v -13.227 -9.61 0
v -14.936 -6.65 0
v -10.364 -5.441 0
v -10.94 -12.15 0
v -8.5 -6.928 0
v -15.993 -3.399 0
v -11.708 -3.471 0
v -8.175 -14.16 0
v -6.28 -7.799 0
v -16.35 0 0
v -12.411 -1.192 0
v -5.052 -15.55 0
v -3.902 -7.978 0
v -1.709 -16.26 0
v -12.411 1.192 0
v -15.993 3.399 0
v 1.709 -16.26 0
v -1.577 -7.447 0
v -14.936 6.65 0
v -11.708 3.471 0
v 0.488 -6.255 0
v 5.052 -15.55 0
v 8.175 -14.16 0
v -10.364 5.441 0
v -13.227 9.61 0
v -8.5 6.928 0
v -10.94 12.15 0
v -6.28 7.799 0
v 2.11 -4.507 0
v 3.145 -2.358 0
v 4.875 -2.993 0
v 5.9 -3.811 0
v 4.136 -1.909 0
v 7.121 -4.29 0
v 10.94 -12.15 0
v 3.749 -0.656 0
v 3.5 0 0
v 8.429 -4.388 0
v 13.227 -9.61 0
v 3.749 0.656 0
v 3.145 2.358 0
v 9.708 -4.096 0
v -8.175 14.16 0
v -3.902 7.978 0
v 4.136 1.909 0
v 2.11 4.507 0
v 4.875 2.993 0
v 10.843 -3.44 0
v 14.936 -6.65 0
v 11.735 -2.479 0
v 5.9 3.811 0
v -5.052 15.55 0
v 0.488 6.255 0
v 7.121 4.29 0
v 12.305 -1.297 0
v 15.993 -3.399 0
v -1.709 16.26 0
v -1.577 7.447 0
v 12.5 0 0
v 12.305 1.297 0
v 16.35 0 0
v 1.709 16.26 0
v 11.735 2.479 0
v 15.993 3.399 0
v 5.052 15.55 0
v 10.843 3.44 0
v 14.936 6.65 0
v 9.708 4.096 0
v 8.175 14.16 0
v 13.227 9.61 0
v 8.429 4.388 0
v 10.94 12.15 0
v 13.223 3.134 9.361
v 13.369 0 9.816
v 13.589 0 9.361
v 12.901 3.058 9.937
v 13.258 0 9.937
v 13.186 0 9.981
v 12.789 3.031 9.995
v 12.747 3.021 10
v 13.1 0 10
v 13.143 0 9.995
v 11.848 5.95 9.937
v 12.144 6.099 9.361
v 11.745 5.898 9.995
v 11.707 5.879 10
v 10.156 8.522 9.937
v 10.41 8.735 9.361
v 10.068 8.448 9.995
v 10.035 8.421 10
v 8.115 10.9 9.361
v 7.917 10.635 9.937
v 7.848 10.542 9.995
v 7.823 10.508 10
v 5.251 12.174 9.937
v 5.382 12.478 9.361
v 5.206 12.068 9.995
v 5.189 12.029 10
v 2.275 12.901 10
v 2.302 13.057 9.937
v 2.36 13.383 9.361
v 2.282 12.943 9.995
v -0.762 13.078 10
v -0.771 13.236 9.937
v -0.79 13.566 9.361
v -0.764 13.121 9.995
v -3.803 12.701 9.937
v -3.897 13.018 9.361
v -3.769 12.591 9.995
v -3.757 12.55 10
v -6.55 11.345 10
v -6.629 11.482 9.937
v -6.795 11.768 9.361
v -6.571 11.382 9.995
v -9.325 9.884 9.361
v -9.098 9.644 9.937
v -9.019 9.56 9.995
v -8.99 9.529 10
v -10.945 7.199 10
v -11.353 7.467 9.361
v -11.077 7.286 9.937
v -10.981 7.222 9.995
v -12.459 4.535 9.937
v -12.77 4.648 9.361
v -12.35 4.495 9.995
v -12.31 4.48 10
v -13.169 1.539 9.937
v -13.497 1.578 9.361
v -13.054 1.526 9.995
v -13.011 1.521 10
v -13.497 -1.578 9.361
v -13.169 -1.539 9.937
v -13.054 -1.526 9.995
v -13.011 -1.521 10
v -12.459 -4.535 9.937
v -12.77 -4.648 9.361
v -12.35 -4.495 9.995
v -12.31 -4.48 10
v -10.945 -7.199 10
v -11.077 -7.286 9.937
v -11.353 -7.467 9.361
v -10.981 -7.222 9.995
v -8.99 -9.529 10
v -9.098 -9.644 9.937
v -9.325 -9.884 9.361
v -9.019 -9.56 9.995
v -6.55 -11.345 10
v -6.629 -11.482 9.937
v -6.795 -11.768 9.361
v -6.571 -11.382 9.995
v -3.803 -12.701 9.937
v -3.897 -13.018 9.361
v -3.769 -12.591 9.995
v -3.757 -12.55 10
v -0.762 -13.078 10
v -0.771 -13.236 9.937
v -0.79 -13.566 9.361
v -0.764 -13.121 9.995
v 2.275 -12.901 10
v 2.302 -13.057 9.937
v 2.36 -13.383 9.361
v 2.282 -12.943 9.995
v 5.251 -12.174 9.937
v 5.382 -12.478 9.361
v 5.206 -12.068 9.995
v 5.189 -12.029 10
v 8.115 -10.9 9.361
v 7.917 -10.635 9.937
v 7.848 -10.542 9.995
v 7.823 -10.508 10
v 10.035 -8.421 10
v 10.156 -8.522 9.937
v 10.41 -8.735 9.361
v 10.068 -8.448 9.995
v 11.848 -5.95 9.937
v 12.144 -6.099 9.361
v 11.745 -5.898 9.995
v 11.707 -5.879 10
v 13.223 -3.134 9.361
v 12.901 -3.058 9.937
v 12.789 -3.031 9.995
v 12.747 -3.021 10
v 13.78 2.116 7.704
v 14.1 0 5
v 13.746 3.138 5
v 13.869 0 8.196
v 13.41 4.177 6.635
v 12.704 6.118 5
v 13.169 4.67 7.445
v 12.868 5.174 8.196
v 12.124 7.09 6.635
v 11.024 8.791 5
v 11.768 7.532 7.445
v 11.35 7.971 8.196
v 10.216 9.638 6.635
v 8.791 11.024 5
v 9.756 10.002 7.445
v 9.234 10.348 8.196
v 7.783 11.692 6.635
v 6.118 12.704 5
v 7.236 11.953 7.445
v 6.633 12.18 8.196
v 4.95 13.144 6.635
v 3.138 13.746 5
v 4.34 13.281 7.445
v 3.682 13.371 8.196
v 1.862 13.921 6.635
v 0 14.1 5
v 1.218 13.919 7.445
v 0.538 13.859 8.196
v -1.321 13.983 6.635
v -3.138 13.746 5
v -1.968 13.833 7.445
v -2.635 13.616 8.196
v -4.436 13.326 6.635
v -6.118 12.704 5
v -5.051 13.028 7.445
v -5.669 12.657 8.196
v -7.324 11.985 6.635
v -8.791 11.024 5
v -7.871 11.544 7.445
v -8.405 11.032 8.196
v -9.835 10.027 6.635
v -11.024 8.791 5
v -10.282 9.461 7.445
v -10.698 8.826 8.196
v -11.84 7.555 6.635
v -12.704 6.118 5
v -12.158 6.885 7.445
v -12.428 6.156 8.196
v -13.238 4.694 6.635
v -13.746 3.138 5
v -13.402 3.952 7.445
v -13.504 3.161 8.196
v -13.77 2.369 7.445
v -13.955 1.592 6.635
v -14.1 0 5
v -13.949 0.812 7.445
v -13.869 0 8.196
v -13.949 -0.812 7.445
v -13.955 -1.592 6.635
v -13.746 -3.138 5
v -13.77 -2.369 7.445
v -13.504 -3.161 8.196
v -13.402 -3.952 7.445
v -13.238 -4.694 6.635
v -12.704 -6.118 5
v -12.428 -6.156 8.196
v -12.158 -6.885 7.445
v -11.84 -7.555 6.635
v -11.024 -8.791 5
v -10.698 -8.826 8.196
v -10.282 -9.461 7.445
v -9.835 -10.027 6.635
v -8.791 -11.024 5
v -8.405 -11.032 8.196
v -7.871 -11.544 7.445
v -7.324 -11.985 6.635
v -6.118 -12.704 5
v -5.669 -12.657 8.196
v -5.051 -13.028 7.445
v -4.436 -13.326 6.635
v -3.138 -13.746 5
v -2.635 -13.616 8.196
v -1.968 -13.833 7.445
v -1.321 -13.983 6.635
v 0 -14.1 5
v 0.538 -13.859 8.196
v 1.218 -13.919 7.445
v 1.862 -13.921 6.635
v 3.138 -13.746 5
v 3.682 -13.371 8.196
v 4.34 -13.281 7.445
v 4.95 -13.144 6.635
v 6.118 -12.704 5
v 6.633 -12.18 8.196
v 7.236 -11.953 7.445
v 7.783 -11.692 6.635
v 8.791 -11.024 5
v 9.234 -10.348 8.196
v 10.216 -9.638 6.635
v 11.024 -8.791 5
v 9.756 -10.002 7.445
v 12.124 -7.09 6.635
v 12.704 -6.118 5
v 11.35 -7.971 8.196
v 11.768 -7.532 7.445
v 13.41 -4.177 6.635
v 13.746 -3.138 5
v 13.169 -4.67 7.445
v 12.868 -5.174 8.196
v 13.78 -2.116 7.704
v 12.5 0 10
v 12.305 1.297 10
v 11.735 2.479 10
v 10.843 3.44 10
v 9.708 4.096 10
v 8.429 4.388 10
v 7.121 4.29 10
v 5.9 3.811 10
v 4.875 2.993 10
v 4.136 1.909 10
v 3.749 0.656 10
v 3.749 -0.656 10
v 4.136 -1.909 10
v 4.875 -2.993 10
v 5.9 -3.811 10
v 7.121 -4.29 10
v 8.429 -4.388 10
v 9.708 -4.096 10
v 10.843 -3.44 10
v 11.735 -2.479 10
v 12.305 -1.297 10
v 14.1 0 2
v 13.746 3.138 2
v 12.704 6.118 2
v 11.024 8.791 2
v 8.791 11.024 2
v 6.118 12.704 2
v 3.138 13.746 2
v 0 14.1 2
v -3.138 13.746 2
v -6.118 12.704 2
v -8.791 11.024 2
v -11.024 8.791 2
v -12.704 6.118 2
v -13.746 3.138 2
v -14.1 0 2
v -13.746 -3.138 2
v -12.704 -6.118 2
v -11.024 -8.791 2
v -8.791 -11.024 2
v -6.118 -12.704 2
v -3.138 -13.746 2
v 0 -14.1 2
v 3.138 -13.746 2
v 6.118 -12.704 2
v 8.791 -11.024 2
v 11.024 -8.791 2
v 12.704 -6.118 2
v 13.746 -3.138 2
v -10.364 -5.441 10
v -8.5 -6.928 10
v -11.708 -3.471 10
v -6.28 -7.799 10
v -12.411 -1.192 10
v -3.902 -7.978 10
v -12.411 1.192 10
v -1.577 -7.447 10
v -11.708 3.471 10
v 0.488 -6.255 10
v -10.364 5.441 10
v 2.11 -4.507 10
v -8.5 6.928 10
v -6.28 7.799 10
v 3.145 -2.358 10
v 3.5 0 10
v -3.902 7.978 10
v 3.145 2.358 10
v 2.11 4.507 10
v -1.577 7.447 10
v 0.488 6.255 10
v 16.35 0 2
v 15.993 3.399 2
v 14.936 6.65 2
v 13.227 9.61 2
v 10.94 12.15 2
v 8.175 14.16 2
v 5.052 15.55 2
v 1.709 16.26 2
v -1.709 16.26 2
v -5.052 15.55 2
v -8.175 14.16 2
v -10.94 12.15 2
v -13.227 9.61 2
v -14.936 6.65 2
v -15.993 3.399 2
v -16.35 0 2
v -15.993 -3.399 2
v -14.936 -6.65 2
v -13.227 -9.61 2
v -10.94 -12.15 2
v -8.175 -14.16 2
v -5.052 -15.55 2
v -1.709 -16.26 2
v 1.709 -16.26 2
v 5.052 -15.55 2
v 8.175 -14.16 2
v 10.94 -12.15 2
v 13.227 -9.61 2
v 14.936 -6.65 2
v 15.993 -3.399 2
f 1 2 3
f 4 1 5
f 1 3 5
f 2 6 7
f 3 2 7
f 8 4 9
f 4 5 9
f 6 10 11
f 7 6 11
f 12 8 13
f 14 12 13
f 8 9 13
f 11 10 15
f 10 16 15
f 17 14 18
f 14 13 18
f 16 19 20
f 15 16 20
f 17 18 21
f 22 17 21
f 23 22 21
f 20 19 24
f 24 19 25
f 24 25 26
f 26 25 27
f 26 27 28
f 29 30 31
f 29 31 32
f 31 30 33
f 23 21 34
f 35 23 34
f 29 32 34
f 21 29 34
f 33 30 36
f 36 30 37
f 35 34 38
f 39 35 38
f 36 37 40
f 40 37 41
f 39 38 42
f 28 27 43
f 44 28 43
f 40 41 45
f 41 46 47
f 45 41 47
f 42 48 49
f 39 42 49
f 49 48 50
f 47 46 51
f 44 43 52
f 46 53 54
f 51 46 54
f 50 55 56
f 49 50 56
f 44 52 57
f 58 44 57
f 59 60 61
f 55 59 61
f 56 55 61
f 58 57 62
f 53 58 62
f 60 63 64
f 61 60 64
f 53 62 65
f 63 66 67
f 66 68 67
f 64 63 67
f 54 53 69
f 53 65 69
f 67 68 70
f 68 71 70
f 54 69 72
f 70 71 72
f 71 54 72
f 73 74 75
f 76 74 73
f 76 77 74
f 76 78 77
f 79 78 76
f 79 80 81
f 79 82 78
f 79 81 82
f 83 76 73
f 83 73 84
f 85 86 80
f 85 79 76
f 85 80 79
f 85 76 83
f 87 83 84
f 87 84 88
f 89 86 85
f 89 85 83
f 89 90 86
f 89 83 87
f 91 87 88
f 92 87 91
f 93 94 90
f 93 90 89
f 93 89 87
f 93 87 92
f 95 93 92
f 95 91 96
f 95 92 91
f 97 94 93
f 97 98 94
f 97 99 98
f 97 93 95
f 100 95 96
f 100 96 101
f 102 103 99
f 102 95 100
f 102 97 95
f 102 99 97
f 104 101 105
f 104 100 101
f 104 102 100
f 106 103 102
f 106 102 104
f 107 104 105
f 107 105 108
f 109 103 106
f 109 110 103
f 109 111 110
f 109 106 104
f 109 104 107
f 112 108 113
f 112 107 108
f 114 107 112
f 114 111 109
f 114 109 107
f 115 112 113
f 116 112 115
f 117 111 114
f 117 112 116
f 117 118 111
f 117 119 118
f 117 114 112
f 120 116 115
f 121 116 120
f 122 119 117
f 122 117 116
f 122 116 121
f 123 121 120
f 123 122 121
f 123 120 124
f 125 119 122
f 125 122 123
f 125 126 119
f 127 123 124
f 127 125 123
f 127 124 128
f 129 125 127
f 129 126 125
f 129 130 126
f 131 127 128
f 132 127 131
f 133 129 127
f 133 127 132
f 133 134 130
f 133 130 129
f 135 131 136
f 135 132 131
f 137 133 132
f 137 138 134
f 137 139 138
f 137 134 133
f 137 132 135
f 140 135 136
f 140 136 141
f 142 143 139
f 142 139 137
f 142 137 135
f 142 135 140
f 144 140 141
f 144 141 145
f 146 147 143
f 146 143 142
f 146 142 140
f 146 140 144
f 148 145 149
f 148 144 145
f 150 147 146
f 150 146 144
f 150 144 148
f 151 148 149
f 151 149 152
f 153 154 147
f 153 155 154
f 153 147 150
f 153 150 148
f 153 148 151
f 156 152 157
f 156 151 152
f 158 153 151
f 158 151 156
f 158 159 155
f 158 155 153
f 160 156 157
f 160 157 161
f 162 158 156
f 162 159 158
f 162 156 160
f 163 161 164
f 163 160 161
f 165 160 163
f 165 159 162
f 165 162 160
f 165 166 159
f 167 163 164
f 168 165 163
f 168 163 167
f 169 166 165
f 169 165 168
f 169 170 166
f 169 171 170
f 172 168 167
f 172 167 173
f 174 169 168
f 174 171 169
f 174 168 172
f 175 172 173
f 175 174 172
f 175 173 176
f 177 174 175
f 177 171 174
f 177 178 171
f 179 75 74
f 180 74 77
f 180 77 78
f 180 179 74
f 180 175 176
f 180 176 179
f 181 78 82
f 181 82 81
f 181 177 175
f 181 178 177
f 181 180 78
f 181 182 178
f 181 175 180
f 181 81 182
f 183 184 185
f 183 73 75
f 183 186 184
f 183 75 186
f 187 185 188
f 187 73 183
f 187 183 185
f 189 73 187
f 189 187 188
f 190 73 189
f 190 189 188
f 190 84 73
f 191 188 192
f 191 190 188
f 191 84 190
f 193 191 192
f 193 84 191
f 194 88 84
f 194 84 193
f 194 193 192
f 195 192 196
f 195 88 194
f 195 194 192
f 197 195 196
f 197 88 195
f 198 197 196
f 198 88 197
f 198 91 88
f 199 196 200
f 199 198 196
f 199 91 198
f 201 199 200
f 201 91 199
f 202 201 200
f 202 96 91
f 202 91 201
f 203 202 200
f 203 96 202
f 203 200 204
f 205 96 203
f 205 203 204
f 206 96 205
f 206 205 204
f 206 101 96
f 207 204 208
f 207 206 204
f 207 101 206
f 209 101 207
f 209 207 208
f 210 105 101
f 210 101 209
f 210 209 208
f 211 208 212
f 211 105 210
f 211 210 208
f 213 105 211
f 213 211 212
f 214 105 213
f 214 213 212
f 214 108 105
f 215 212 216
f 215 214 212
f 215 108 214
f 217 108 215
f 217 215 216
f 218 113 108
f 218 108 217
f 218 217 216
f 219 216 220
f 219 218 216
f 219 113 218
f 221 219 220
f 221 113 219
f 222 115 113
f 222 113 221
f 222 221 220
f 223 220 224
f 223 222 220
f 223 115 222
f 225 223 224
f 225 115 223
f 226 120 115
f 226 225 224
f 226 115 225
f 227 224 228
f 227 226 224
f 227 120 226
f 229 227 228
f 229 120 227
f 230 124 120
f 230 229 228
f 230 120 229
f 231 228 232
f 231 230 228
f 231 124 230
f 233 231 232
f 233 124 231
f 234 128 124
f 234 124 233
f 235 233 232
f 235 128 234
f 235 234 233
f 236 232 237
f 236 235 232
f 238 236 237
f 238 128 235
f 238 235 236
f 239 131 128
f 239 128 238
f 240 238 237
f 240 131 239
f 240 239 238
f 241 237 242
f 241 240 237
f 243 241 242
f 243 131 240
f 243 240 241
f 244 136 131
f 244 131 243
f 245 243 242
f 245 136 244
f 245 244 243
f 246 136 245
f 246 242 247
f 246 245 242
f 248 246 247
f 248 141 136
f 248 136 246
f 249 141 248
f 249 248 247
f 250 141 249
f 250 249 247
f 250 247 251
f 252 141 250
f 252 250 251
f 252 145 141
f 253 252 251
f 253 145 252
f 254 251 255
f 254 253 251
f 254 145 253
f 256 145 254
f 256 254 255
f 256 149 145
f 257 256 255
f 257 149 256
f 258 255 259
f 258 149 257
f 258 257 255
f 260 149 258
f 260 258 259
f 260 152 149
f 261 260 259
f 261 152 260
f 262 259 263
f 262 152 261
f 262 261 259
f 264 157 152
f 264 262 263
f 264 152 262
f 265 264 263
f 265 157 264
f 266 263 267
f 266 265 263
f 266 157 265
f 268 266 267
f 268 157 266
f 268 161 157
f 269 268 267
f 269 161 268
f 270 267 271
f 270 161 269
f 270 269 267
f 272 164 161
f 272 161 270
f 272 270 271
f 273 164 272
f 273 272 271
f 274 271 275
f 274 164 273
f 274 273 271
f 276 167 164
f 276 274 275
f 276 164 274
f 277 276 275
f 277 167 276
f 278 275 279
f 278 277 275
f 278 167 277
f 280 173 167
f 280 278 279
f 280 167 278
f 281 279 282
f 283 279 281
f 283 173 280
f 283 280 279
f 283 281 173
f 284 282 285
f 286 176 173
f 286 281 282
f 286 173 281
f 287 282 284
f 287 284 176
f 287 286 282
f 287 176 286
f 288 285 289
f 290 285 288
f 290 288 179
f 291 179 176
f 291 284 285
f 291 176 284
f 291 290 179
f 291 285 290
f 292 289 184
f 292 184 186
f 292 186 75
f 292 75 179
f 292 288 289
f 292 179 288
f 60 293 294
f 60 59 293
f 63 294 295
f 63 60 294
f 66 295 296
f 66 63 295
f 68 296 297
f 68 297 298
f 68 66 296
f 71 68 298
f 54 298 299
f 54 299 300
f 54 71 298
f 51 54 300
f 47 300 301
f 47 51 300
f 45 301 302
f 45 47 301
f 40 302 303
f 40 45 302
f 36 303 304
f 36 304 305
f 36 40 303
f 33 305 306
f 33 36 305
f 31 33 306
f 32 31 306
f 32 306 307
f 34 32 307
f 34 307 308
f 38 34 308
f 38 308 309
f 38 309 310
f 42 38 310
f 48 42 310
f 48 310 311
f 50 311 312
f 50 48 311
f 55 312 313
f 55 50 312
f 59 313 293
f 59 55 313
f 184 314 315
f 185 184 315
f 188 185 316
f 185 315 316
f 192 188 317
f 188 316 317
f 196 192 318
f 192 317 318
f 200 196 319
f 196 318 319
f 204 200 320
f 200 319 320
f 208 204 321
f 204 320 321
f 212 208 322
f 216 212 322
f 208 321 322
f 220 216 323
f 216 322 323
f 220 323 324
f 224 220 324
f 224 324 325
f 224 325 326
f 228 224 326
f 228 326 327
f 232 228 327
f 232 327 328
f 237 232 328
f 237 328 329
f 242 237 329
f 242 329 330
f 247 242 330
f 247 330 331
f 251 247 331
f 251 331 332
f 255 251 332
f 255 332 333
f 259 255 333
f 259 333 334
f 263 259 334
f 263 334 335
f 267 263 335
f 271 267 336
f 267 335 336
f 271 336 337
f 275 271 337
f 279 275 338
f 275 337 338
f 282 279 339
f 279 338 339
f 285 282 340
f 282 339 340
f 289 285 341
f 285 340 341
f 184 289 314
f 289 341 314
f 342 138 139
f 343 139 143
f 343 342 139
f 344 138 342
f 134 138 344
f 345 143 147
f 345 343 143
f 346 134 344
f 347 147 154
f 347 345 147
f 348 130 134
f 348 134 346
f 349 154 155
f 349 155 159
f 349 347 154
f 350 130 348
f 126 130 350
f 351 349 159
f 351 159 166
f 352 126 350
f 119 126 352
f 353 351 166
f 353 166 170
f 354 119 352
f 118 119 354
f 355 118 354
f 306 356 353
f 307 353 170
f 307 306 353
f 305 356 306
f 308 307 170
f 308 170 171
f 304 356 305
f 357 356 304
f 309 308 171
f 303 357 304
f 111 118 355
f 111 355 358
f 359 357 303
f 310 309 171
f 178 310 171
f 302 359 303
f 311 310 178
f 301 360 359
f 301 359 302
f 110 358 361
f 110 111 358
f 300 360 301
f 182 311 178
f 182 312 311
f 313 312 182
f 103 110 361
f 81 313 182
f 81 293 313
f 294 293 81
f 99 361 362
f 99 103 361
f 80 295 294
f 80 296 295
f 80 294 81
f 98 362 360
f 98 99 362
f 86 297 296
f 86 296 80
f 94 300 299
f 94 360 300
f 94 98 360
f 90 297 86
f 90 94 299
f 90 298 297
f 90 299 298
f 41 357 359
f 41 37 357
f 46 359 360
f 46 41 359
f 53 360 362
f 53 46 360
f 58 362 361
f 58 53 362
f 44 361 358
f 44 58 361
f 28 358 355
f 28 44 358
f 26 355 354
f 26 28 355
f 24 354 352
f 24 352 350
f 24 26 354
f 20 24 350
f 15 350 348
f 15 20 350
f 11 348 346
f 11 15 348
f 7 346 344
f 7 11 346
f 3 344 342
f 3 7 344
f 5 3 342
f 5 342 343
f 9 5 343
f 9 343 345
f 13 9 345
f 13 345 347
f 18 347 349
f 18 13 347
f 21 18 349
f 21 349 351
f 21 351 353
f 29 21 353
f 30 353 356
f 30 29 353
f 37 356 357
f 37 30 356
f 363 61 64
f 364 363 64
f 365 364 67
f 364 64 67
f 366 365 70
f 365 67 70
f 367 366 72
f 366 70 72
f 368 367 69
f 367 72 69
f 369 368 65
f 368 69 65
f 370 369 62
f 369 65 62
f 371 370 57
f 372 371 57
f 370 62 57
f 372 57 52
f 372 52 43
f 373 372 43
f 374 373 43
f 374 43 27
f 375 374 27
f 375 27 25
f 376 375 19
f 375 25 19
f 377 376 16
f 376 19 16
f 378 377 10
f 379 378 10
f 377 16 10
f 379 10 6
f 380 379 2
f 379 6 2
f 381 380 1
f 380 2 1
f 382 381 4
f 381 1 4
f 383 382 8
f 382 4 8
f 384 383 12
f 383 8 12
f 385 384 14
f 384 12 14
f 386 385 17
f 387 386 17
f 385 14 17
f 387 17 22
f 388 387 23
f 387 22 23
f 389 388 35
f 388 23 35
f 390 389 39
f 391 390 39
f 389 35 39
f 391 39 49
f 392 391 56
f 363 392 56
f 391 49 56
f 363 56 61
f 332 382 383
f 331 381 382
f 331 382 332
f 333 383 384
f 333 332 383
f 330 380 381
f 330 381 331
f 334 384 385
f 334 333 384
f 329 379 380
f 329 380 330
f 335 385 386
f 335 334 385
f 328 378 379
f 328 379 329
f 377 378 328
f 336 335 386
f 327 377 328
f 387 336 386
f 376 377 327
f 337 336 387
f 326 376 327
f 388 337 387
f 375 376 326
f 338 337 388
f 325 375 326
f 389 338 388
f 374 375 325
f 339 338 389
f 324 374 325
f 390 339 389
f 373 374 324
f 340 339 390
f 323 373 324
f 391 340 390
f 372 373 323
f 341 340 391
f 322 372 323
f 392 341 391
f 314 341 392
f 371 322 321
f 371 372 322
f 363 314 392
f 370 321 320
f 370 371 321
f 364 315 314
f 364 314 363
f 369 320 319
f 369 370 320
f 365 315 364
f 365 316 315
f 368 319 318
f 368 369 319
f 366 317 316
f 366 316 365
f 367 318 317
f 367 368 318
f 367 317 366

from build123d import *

# Parameters (mm, degrees)
SKETCH_1_R      = 16.35
SKETCH_1_R_2    = 4.4
SKETCH_1_R_3    = 8
EXTRUDE_1_DEPTH = 2
SKETCH_2_R      = 14.1
SKETCH_2_R_2    = 4.4
SKETCH_2_R_3    = 8
EXTRUDE_2_DEPTH = 8
FILLET_1_SIZE   = 5
FILLET_1_SIZE_2 = 1


with BuildPart() as part:
    # 草图1 → 凸台-拉伸1 (new body)
    with BuildSketch(Plane.XY):
        Circle(SKETCH_1_R)
        with Locations((8.1, 0)):
            Circle(SKETCH_1_R_2, mode=Mode.SUBTRACT)
        with Locations((-4.5, 0)):
            Circle(SKETCH_1_R_3, mode=Mode.SUBTRACT)
    extrude(amount=EXTRUDE_1_DEPTH)

    # 草图2 → 凸台-拉伸2 (add)
    with BuildSketch(Plane.XY.offset(2)):
        Circle(SKETCH_2_R)
        with Locations((8.1, 0)):
            Circle(SKETCH_2_R_2, mode=Mode.SUBTRACT)
        with Locations((-4.5, 0)):
            Circle(SKETCH_2_R_3, mode=Mode.SUBTRACT)
    extrude(amount=EXTRUDE_2_DEPTH)

    # 圆角1
    # an asymmetric fillet: 5, 1 mm, written as the material it takes off along each edge
    with BuildSketch(Plane(origin=(0, 0, 10), x_dir=(1, 0, 0), z_dir=(0, -1, 0))) as fillet_1_piece_1:
        with BuildLine():
            Bezier((14.1, -FILLET_1_SIZE), (14.1, 0), (14.1 - FILLET_1_SIZE_2, 0), weights=[1, 0.707106781, 1])
            Line((14.1 - FILLET_1_SIZE_2, 0), (14.1, 0))
            Line((14.1, 0), (14.1, -FILLET_1_SIZE))
        make_face()
    revolve(axis=Axis((0, 0, 10), (0, 0, 1)), mode=Mode.SUBTRACT)


solid = part.part
